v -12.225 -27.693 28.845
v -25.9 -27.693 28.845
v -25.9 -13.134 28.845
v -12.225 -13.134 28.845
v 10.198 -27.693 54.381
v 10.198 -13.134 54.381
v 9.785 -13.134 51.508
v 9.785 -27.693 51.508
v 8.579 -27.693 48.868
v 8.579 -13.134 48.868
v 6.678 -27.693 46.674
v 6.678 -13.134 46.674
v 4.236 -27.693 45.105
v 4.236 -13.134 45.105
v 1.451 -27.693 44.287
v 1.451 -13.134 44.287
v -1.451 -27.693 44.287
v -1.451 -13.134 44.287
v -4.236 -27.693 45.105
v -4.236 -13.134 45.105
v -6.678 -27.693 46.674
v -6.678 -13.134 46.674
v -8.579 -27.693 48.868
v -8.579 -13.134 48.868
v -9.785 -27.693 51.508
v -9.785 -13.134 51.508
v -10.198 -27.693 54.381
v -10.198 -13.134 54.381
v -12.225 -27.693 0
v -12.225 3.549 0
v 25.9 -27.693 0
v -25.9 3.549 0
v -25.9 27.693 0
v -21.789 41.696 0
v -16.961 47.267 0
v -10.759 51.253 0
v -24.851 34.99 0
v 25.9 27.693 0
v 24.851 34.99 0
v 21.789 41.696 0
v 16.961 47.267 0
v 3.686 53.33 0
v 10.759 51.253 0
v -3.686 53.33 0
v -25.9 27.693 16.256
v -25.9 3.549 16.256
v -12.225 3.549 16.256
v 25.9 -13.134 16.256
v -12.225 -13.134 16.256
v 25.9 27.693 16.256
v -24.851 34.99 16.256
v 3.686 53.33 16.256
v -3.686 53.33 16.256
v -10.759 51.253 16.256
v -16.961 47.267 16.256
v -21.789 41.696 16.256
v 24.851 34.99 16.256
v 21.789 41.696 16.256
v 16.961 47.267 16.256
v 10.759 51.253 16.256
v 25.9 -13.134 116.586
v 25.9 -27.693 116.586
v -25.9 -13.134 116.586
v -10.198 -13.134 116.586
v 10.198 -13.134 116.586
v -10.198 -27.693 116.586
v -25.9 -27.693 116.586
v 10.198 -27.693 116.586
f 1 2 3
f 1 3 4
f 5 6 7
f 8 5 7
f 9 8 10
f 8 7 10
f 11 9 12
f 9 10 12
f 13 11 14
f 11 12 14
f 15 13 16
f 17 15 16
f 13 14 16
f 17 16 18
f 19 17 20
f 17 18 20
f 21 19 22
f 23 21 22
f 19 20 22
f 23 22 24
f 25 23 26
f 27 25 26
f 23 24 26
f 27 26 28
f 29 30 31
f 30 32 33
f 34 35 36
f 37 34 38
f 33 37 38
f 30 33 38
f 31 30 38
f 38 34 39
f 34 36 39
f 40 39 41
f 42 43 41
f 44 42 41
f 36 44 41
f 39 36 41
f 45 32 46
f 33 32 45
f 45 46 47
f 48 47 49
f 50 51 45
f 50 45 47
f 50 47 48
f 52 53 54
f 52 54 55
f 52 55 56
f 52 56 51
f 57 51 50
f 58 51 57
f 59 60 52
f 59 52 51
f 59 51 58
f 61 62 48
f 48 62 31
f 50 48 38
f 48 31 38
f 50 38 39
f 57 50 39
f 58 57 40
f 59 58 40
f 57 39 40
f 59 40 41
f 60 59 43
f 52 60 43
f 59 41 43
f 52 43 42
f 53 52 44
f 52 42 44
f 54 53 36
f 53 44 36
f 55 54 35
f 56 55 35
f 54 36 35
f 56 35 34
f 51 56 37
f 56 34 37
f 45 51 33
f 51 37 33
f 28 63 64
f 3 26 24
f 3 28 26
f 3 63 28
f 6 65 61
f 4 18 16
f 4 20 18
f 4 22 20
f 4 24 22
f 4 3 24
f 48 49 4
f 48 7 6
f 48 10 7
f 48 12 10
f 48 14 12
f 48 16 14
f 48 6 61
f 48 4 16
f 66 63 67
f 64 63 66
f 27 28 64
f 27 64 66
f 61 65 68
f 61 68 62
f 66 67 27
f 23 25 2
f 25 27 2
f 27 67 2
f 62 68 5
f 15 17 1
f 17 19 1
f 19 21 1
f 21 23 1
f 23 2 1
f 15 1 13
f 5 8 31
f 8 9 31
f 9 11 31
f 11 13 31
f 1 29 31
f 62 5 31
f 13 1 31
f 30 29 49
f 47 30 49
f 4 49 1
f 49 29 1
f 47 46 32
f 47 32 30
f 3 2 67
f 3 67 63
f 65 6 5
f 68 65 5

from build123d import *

# Parameters (mm, degrees)
F1_DEPTH = 16.256
F2_W     = 51.8002919853
F2_H     = 14.5590286702
F3_DEPTH = 100.33
F5_DEPTH = 39.116
F6_DEPTH = 25.4
F7_W     = 13.6753991246
F7_H     = 28.8449618965
F8_DEPTH = 31.242


with BuildPart() as f1:
    # F0 (on Top) → F1 (new body)
    with BuildSketch(Plane.XY):
        with BuildLine():
            Line((-25.9001459926, -27.6933182031), (25.9001459926, -27.6933182031))
            Line((25.9001459926, -27.6933182031), (25.9001459926, 27.6933182031))
            ThreePointArc((25.9001459926, 27.6933182031), (0, 53.5934641957), (-25.9001459926, 27.6933182031))
            Line((-25.9001459926, 27.6933182031), (-25.9001459926, -27.6933182031))
        make_face()
    extrude(amount=F1_DEPTH)

    # F2 (on face) → F3 (join)
    with BuildSketch(Plane.XY.offset(16.256)):
        with Locations((0, -20.413803868)):
            Rectangle(F2_W, F2_H)
    extrude(amount=F3_DEPTH)

    # F4 (on face) → F5 (cut)
    with BuildSketch(Plane(origin=(0, -13.1342895329, 0), x_dir=(-1, 0, 0), z_dir=(0, 1, 0))):
        with BuildLine():
            Line((10.1979328319, 54.3813481927), (10.1979328319, 116.5178194642))
            Line((10.1979328319, 116.5178194642), (-10.1979328319, 116.5178194642))
            Line((-10.1979328319, 116.5178194642), (-10.1979328319, 54.3813481927))
            ThreePointArc((-10.1979328319, 54.3813481927), (0, 44.1834153607), (10.1979328319, 54.3813481927))
        make_face()
    extrude(amount=-F5_DEPTH, mode=Mode.SUBTRACT)

    # F6 (cut): a face of the model
    f6_faces = [f1.faces().sort_by_distance(p)[0] for p in [
        (0, -20.413803868, 116.5178194642),
    ]]
    extrude(f6_faces, amount=-F6_DEPTH, mode=Mode.SUBTRACT)

    # F7 (on face) → F8 (cut)
    with BuildSketch(Plane.XZ.offset(27.6933182031)):
        with Locations((-19.0624464303, 14.4224809483)):
            Rectangle(F7_W, F7_H)
    extrude(amount=-F8_DEPTH, mode=Mode.SUBTRACT)


solid = f1.part
